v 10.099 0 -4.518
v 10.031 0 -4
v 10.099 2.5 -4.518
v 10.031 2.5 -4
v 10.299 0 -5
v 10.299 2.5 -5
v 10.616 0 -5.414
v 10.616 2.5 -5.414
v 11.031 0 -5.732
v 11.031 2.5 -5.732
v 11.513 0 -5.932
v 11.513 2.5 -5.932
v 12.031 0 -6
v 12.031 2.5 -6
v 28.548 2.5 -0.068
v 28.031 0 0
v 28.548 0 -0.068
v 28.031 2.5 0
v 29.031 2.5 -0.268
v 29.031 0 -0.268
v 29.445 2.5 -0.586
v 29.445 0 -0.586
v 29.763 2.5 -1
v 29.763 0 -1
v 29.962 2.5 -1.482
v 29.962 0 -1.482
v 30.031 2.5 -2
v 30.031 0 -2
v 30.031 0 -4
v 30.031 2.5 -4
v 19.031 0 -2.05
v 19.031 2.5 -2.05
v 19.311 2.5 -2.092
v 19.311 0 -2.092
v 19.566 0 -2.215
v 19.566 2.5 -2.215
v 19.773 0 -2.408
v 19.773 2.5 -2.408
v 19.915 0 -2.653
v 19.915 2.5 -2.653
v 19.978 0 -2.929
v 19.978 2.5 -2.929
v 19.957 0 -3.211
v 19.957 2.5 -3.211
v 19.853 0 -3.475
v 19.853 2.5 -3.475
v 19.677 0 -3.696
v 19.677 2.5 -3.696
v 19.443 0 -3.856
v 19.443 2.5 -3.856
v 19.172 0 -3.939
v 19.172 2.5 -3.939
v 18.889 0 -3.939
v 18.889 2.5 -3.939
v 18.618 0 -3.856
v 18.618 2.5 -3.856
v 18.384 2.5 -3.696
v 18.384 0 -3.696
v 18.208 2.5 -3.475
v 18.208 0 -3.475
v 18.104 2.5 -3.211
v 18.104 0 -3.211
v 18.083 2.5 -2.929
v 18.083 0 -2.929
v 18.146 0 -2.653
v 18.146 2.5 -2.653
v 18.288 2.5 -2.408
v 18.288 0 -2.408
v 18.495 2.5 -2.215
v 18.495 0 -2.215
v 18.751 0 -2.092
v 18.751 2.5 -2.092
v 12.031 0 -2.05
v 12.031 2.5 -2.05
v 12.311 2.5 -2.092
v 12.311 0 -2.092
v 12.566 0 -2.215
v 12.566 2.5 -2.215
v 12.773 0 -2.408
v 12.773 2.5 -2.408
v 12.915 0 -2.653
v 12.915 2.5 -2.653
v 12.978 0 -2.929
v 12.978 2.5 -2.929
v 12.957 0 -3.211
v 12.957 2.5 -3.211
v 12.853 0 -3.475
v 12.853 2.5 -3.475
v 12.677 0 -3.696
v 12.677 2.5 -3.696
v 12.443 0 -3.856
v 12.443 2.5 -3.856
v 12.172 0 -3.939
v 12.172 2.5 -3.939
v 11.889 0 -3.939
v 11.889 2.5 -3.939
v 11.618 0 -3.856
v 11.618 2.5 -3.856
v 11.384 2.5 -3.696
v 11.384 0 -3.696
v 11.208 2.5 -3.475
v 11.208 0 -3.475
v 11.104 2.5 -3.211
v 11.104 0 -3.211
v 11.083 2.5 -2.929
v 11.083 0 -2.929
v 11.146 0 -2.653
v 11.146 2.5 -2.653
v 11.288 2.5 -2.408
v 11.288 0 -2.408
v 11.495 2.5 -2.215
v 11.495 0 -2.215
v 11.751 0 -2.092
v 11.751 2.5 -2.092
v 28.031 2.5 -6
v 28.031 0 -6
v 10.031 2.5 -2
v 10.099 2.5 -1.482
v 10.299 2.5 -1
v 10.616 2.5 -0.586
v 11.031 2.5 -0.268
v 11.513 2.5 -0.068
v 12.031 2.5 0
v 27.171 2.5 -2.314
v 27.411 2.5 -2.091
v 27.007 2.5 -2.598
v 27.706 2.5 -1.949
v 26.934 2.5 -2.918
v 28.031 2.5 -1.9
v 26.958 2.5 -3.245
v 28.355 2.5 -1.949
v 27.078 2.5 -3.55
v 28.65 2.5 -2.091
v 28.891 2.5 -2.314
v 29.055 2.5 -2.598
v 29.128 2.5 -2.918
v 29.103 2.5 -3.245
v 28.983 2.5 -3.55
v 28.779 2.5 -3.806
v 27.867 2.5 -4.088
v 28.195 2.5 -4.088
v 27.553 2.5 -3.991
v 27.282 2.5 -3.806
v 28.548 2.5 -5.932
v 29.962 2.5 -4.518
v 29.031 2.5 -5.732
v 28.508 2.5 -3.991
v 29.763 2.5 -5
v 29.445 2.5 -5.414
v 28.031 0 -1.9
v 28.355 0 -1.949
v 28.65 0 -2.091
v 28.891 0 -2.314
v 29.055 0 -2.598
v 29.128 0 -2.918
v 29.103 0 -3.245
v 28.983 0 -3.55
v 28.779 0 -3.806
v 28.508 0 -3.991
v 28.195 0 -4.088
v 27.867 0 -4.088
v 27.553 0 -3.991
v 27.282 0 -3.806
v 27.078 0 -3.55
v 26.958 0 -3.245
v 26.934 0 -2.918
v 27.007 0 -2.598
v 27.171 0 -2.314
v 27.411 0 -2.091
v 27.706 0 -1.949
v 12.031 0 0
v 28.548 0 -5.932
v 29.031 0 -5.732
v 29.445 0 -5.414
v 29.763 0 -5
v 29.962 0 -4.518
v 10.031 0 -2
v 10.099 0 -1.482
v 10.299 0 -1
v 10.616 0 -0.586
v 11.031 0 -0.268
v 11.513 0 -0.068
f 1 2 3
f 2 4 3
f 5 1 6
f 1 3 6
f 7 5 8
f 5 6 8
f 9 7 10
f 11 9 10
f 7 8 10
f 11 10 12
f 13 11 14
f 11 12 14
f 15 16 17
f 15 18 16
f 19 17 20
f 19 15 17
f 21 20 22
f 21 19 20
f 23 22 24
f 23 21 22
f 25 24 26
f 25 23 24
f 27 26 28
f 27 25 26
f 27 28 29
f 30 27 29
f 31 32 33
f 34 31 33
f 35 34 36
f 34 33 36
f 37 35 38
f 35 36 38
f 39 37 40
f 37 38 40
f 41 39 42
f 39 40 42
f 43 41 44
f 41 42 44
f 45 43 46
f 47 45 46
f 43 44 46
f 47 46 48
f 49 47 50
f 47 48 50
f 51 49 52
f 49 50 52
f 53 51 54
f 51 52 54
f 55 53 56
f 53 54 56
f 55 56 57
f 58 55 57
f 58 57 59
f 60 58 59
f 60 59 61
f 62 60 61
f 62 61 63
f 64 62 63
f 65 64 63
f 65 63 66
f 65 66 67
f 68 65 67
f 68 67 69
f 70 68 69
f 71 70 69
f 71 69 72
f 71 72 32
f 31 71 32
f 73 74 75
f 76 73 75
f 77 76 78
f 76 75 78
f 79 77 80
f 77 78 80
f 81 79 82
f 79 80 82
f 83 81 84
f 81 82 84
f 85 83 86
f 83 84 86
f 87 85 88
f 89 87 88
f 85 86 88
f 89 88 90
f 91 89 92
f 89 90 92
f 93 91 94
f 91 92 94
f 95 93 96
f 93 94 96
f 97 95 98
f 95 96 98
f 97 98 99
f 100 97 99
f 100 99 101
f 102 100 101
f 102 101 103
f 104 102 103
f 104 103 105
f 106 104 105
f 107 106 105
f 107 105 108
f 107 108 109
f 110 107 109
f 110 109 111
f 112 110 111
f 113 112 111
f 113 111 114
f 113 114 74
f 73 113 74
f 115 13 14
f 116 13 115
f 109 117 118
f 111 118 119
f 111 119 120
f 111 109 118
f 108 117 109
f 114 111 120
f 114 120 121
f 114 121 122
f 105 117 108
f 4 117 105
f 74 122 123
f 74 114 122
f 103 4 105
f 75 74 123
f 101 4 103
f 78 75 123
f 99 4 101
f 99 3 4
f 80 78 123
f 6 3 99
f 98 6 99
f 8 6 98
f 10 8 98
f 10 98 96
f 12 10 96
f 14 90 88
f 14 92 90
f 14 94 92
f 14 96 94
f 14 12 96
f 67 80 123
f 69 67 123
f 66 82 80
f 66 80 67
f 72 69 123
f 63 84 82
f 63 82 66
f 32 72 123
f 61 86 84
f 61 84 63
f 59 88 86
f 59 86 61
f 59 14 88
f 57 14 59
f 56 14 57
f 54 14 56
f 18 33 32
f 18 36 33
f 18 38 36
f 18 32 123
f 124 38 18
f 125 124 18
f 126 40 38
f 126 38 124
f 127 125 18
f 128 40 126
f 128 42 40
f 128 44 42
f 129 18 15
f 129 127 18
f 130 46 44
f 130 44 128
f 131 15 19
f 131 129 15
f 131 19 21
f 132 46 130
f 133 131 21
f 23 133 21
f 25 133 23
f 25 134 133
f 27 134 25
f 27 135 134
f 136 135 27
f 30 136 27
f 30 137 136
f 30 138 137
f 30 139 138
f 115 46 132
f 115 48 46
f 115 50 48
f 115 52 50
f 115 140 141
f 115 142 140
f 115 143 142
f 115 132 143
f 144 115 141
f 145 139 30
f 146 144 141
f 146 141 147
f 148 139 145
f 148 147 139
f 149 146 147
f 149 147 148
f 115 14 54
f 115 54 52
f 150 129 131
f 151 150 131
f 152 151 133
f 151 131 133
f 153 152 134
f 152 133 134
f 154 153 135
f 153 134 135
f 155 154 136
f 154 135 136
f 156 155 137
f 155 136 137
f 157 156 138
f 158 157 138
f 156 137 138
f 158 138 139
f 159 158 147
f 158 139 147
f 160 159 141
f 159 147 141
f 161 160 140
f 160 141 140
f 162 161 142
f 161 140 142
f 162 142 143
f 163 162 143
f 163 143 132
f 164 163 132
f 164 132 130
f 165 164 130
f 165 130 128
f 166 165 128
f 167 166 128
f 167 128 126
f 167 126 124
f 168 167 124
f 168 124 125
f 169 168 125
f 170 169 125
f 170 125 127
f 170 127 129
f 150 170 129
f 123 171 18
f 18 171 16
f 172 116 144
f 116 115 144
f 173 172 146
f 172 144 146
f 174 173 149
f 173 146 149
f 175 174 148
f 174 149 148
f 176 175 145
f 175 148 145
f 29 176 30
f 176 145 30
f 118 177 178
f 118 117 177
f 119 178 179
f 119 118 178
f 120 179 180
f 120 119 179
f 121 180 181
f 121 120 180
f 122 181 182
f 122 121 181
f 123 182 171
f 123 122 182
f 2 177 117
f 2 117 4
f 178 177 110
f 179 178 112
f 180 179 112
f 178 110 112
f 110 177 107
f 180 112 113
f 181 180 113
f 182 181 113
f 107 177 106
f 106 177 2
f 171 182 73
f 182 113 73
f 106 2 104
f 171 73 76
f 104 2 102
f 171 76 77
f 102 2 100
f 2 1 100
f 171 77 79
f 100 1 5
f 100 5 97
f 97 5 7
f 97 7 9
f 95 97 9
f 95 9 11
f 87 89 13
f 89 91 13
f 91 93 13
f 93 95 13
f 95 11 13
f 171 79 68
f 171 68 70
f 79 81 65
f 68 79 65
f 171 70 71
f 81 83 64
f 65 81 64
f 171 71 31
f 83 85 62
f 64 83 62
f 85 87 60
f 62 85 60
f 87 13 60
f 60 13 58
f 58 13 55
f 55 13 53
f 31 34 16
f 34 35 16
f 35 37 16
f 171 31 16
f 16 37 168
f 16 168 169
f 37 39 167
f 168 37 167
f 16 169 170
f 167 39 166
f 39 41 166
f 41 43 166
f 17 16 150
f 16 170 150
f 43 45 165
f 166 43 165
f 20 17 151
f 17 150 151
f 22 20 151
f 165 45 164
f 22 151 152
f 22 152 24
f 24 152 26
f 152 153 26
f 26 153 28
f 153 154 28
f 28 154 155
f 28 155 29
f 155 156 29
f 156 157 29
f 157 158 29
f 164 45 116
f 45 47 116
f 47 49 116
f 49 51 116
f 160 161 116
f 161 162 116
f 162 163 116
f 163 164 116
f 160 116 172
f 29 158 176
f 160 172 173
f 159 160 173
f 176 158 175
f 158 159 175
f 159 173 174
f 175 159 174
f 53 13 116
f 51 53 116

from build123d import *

# Parameters (mm, degrees)
SKETCH_1_W          = 20
SKETCH_1_H          = 6
EXTRUDE_1_DEPTH     = 2.5
SKETCH_2_R          = 1.1
SKETCH_2_R_2        = 0.95
CUT_EXTRUDE_1_DEPTH = 31.72599184
FILLET_1_R          = 2


with BuildPart() as part:
    # 草图1 → 凸台-拉伸1 (new body)
    with BuildSketch(Plane(origin=(0, 0, 0), x_dir=(1, 0, 0), z_dir=(0, 1, 0))):
        with Locations((20.030593976, 3)):
            Rectangle(SKETCH_1_W, SKETCH_1_H)
    extrude(amount=EXTRUDE_1_DEPTH)

    # 草图2 → 切除-拉伸1 (cut, through all)
    with BuildSketch(Plane(origin=(0, 2.5, 0), x_dir=(1, 0, 0), z_dir=(0, 1, 0))):
        with Locations(Location((28.030593976, 3, 0), (0, 0, 270))):
            Circle(SKETCH_2_R)
        with Locations(Location((12.030593976, 3, 0), (0, 0, 270))):
            Circle(SKETCH_2_R_2)
        with Locations(Location((19.030593976, 3, 0), (0, 0, 270))):
            Circle(SKETCH_2_R_2)
    extrude(amount=-CUT_EXTRUDE_1_DEPTH, mode=Mode.SUBTRACT)

    # 圆角1
    fillet_1_edges = [part.edges().sort_by_distance(p)[0] for p in [
        (10.030593976, 1.25, -6),
        (30.030593976, 1.25, -6),
        (30.030593976, 1.25, 0),
        (10.030593976, 1.25, 0),
    ]]
    fillet(fillet_1_edges, radius=FILLET_1_R)


solid = part.part
